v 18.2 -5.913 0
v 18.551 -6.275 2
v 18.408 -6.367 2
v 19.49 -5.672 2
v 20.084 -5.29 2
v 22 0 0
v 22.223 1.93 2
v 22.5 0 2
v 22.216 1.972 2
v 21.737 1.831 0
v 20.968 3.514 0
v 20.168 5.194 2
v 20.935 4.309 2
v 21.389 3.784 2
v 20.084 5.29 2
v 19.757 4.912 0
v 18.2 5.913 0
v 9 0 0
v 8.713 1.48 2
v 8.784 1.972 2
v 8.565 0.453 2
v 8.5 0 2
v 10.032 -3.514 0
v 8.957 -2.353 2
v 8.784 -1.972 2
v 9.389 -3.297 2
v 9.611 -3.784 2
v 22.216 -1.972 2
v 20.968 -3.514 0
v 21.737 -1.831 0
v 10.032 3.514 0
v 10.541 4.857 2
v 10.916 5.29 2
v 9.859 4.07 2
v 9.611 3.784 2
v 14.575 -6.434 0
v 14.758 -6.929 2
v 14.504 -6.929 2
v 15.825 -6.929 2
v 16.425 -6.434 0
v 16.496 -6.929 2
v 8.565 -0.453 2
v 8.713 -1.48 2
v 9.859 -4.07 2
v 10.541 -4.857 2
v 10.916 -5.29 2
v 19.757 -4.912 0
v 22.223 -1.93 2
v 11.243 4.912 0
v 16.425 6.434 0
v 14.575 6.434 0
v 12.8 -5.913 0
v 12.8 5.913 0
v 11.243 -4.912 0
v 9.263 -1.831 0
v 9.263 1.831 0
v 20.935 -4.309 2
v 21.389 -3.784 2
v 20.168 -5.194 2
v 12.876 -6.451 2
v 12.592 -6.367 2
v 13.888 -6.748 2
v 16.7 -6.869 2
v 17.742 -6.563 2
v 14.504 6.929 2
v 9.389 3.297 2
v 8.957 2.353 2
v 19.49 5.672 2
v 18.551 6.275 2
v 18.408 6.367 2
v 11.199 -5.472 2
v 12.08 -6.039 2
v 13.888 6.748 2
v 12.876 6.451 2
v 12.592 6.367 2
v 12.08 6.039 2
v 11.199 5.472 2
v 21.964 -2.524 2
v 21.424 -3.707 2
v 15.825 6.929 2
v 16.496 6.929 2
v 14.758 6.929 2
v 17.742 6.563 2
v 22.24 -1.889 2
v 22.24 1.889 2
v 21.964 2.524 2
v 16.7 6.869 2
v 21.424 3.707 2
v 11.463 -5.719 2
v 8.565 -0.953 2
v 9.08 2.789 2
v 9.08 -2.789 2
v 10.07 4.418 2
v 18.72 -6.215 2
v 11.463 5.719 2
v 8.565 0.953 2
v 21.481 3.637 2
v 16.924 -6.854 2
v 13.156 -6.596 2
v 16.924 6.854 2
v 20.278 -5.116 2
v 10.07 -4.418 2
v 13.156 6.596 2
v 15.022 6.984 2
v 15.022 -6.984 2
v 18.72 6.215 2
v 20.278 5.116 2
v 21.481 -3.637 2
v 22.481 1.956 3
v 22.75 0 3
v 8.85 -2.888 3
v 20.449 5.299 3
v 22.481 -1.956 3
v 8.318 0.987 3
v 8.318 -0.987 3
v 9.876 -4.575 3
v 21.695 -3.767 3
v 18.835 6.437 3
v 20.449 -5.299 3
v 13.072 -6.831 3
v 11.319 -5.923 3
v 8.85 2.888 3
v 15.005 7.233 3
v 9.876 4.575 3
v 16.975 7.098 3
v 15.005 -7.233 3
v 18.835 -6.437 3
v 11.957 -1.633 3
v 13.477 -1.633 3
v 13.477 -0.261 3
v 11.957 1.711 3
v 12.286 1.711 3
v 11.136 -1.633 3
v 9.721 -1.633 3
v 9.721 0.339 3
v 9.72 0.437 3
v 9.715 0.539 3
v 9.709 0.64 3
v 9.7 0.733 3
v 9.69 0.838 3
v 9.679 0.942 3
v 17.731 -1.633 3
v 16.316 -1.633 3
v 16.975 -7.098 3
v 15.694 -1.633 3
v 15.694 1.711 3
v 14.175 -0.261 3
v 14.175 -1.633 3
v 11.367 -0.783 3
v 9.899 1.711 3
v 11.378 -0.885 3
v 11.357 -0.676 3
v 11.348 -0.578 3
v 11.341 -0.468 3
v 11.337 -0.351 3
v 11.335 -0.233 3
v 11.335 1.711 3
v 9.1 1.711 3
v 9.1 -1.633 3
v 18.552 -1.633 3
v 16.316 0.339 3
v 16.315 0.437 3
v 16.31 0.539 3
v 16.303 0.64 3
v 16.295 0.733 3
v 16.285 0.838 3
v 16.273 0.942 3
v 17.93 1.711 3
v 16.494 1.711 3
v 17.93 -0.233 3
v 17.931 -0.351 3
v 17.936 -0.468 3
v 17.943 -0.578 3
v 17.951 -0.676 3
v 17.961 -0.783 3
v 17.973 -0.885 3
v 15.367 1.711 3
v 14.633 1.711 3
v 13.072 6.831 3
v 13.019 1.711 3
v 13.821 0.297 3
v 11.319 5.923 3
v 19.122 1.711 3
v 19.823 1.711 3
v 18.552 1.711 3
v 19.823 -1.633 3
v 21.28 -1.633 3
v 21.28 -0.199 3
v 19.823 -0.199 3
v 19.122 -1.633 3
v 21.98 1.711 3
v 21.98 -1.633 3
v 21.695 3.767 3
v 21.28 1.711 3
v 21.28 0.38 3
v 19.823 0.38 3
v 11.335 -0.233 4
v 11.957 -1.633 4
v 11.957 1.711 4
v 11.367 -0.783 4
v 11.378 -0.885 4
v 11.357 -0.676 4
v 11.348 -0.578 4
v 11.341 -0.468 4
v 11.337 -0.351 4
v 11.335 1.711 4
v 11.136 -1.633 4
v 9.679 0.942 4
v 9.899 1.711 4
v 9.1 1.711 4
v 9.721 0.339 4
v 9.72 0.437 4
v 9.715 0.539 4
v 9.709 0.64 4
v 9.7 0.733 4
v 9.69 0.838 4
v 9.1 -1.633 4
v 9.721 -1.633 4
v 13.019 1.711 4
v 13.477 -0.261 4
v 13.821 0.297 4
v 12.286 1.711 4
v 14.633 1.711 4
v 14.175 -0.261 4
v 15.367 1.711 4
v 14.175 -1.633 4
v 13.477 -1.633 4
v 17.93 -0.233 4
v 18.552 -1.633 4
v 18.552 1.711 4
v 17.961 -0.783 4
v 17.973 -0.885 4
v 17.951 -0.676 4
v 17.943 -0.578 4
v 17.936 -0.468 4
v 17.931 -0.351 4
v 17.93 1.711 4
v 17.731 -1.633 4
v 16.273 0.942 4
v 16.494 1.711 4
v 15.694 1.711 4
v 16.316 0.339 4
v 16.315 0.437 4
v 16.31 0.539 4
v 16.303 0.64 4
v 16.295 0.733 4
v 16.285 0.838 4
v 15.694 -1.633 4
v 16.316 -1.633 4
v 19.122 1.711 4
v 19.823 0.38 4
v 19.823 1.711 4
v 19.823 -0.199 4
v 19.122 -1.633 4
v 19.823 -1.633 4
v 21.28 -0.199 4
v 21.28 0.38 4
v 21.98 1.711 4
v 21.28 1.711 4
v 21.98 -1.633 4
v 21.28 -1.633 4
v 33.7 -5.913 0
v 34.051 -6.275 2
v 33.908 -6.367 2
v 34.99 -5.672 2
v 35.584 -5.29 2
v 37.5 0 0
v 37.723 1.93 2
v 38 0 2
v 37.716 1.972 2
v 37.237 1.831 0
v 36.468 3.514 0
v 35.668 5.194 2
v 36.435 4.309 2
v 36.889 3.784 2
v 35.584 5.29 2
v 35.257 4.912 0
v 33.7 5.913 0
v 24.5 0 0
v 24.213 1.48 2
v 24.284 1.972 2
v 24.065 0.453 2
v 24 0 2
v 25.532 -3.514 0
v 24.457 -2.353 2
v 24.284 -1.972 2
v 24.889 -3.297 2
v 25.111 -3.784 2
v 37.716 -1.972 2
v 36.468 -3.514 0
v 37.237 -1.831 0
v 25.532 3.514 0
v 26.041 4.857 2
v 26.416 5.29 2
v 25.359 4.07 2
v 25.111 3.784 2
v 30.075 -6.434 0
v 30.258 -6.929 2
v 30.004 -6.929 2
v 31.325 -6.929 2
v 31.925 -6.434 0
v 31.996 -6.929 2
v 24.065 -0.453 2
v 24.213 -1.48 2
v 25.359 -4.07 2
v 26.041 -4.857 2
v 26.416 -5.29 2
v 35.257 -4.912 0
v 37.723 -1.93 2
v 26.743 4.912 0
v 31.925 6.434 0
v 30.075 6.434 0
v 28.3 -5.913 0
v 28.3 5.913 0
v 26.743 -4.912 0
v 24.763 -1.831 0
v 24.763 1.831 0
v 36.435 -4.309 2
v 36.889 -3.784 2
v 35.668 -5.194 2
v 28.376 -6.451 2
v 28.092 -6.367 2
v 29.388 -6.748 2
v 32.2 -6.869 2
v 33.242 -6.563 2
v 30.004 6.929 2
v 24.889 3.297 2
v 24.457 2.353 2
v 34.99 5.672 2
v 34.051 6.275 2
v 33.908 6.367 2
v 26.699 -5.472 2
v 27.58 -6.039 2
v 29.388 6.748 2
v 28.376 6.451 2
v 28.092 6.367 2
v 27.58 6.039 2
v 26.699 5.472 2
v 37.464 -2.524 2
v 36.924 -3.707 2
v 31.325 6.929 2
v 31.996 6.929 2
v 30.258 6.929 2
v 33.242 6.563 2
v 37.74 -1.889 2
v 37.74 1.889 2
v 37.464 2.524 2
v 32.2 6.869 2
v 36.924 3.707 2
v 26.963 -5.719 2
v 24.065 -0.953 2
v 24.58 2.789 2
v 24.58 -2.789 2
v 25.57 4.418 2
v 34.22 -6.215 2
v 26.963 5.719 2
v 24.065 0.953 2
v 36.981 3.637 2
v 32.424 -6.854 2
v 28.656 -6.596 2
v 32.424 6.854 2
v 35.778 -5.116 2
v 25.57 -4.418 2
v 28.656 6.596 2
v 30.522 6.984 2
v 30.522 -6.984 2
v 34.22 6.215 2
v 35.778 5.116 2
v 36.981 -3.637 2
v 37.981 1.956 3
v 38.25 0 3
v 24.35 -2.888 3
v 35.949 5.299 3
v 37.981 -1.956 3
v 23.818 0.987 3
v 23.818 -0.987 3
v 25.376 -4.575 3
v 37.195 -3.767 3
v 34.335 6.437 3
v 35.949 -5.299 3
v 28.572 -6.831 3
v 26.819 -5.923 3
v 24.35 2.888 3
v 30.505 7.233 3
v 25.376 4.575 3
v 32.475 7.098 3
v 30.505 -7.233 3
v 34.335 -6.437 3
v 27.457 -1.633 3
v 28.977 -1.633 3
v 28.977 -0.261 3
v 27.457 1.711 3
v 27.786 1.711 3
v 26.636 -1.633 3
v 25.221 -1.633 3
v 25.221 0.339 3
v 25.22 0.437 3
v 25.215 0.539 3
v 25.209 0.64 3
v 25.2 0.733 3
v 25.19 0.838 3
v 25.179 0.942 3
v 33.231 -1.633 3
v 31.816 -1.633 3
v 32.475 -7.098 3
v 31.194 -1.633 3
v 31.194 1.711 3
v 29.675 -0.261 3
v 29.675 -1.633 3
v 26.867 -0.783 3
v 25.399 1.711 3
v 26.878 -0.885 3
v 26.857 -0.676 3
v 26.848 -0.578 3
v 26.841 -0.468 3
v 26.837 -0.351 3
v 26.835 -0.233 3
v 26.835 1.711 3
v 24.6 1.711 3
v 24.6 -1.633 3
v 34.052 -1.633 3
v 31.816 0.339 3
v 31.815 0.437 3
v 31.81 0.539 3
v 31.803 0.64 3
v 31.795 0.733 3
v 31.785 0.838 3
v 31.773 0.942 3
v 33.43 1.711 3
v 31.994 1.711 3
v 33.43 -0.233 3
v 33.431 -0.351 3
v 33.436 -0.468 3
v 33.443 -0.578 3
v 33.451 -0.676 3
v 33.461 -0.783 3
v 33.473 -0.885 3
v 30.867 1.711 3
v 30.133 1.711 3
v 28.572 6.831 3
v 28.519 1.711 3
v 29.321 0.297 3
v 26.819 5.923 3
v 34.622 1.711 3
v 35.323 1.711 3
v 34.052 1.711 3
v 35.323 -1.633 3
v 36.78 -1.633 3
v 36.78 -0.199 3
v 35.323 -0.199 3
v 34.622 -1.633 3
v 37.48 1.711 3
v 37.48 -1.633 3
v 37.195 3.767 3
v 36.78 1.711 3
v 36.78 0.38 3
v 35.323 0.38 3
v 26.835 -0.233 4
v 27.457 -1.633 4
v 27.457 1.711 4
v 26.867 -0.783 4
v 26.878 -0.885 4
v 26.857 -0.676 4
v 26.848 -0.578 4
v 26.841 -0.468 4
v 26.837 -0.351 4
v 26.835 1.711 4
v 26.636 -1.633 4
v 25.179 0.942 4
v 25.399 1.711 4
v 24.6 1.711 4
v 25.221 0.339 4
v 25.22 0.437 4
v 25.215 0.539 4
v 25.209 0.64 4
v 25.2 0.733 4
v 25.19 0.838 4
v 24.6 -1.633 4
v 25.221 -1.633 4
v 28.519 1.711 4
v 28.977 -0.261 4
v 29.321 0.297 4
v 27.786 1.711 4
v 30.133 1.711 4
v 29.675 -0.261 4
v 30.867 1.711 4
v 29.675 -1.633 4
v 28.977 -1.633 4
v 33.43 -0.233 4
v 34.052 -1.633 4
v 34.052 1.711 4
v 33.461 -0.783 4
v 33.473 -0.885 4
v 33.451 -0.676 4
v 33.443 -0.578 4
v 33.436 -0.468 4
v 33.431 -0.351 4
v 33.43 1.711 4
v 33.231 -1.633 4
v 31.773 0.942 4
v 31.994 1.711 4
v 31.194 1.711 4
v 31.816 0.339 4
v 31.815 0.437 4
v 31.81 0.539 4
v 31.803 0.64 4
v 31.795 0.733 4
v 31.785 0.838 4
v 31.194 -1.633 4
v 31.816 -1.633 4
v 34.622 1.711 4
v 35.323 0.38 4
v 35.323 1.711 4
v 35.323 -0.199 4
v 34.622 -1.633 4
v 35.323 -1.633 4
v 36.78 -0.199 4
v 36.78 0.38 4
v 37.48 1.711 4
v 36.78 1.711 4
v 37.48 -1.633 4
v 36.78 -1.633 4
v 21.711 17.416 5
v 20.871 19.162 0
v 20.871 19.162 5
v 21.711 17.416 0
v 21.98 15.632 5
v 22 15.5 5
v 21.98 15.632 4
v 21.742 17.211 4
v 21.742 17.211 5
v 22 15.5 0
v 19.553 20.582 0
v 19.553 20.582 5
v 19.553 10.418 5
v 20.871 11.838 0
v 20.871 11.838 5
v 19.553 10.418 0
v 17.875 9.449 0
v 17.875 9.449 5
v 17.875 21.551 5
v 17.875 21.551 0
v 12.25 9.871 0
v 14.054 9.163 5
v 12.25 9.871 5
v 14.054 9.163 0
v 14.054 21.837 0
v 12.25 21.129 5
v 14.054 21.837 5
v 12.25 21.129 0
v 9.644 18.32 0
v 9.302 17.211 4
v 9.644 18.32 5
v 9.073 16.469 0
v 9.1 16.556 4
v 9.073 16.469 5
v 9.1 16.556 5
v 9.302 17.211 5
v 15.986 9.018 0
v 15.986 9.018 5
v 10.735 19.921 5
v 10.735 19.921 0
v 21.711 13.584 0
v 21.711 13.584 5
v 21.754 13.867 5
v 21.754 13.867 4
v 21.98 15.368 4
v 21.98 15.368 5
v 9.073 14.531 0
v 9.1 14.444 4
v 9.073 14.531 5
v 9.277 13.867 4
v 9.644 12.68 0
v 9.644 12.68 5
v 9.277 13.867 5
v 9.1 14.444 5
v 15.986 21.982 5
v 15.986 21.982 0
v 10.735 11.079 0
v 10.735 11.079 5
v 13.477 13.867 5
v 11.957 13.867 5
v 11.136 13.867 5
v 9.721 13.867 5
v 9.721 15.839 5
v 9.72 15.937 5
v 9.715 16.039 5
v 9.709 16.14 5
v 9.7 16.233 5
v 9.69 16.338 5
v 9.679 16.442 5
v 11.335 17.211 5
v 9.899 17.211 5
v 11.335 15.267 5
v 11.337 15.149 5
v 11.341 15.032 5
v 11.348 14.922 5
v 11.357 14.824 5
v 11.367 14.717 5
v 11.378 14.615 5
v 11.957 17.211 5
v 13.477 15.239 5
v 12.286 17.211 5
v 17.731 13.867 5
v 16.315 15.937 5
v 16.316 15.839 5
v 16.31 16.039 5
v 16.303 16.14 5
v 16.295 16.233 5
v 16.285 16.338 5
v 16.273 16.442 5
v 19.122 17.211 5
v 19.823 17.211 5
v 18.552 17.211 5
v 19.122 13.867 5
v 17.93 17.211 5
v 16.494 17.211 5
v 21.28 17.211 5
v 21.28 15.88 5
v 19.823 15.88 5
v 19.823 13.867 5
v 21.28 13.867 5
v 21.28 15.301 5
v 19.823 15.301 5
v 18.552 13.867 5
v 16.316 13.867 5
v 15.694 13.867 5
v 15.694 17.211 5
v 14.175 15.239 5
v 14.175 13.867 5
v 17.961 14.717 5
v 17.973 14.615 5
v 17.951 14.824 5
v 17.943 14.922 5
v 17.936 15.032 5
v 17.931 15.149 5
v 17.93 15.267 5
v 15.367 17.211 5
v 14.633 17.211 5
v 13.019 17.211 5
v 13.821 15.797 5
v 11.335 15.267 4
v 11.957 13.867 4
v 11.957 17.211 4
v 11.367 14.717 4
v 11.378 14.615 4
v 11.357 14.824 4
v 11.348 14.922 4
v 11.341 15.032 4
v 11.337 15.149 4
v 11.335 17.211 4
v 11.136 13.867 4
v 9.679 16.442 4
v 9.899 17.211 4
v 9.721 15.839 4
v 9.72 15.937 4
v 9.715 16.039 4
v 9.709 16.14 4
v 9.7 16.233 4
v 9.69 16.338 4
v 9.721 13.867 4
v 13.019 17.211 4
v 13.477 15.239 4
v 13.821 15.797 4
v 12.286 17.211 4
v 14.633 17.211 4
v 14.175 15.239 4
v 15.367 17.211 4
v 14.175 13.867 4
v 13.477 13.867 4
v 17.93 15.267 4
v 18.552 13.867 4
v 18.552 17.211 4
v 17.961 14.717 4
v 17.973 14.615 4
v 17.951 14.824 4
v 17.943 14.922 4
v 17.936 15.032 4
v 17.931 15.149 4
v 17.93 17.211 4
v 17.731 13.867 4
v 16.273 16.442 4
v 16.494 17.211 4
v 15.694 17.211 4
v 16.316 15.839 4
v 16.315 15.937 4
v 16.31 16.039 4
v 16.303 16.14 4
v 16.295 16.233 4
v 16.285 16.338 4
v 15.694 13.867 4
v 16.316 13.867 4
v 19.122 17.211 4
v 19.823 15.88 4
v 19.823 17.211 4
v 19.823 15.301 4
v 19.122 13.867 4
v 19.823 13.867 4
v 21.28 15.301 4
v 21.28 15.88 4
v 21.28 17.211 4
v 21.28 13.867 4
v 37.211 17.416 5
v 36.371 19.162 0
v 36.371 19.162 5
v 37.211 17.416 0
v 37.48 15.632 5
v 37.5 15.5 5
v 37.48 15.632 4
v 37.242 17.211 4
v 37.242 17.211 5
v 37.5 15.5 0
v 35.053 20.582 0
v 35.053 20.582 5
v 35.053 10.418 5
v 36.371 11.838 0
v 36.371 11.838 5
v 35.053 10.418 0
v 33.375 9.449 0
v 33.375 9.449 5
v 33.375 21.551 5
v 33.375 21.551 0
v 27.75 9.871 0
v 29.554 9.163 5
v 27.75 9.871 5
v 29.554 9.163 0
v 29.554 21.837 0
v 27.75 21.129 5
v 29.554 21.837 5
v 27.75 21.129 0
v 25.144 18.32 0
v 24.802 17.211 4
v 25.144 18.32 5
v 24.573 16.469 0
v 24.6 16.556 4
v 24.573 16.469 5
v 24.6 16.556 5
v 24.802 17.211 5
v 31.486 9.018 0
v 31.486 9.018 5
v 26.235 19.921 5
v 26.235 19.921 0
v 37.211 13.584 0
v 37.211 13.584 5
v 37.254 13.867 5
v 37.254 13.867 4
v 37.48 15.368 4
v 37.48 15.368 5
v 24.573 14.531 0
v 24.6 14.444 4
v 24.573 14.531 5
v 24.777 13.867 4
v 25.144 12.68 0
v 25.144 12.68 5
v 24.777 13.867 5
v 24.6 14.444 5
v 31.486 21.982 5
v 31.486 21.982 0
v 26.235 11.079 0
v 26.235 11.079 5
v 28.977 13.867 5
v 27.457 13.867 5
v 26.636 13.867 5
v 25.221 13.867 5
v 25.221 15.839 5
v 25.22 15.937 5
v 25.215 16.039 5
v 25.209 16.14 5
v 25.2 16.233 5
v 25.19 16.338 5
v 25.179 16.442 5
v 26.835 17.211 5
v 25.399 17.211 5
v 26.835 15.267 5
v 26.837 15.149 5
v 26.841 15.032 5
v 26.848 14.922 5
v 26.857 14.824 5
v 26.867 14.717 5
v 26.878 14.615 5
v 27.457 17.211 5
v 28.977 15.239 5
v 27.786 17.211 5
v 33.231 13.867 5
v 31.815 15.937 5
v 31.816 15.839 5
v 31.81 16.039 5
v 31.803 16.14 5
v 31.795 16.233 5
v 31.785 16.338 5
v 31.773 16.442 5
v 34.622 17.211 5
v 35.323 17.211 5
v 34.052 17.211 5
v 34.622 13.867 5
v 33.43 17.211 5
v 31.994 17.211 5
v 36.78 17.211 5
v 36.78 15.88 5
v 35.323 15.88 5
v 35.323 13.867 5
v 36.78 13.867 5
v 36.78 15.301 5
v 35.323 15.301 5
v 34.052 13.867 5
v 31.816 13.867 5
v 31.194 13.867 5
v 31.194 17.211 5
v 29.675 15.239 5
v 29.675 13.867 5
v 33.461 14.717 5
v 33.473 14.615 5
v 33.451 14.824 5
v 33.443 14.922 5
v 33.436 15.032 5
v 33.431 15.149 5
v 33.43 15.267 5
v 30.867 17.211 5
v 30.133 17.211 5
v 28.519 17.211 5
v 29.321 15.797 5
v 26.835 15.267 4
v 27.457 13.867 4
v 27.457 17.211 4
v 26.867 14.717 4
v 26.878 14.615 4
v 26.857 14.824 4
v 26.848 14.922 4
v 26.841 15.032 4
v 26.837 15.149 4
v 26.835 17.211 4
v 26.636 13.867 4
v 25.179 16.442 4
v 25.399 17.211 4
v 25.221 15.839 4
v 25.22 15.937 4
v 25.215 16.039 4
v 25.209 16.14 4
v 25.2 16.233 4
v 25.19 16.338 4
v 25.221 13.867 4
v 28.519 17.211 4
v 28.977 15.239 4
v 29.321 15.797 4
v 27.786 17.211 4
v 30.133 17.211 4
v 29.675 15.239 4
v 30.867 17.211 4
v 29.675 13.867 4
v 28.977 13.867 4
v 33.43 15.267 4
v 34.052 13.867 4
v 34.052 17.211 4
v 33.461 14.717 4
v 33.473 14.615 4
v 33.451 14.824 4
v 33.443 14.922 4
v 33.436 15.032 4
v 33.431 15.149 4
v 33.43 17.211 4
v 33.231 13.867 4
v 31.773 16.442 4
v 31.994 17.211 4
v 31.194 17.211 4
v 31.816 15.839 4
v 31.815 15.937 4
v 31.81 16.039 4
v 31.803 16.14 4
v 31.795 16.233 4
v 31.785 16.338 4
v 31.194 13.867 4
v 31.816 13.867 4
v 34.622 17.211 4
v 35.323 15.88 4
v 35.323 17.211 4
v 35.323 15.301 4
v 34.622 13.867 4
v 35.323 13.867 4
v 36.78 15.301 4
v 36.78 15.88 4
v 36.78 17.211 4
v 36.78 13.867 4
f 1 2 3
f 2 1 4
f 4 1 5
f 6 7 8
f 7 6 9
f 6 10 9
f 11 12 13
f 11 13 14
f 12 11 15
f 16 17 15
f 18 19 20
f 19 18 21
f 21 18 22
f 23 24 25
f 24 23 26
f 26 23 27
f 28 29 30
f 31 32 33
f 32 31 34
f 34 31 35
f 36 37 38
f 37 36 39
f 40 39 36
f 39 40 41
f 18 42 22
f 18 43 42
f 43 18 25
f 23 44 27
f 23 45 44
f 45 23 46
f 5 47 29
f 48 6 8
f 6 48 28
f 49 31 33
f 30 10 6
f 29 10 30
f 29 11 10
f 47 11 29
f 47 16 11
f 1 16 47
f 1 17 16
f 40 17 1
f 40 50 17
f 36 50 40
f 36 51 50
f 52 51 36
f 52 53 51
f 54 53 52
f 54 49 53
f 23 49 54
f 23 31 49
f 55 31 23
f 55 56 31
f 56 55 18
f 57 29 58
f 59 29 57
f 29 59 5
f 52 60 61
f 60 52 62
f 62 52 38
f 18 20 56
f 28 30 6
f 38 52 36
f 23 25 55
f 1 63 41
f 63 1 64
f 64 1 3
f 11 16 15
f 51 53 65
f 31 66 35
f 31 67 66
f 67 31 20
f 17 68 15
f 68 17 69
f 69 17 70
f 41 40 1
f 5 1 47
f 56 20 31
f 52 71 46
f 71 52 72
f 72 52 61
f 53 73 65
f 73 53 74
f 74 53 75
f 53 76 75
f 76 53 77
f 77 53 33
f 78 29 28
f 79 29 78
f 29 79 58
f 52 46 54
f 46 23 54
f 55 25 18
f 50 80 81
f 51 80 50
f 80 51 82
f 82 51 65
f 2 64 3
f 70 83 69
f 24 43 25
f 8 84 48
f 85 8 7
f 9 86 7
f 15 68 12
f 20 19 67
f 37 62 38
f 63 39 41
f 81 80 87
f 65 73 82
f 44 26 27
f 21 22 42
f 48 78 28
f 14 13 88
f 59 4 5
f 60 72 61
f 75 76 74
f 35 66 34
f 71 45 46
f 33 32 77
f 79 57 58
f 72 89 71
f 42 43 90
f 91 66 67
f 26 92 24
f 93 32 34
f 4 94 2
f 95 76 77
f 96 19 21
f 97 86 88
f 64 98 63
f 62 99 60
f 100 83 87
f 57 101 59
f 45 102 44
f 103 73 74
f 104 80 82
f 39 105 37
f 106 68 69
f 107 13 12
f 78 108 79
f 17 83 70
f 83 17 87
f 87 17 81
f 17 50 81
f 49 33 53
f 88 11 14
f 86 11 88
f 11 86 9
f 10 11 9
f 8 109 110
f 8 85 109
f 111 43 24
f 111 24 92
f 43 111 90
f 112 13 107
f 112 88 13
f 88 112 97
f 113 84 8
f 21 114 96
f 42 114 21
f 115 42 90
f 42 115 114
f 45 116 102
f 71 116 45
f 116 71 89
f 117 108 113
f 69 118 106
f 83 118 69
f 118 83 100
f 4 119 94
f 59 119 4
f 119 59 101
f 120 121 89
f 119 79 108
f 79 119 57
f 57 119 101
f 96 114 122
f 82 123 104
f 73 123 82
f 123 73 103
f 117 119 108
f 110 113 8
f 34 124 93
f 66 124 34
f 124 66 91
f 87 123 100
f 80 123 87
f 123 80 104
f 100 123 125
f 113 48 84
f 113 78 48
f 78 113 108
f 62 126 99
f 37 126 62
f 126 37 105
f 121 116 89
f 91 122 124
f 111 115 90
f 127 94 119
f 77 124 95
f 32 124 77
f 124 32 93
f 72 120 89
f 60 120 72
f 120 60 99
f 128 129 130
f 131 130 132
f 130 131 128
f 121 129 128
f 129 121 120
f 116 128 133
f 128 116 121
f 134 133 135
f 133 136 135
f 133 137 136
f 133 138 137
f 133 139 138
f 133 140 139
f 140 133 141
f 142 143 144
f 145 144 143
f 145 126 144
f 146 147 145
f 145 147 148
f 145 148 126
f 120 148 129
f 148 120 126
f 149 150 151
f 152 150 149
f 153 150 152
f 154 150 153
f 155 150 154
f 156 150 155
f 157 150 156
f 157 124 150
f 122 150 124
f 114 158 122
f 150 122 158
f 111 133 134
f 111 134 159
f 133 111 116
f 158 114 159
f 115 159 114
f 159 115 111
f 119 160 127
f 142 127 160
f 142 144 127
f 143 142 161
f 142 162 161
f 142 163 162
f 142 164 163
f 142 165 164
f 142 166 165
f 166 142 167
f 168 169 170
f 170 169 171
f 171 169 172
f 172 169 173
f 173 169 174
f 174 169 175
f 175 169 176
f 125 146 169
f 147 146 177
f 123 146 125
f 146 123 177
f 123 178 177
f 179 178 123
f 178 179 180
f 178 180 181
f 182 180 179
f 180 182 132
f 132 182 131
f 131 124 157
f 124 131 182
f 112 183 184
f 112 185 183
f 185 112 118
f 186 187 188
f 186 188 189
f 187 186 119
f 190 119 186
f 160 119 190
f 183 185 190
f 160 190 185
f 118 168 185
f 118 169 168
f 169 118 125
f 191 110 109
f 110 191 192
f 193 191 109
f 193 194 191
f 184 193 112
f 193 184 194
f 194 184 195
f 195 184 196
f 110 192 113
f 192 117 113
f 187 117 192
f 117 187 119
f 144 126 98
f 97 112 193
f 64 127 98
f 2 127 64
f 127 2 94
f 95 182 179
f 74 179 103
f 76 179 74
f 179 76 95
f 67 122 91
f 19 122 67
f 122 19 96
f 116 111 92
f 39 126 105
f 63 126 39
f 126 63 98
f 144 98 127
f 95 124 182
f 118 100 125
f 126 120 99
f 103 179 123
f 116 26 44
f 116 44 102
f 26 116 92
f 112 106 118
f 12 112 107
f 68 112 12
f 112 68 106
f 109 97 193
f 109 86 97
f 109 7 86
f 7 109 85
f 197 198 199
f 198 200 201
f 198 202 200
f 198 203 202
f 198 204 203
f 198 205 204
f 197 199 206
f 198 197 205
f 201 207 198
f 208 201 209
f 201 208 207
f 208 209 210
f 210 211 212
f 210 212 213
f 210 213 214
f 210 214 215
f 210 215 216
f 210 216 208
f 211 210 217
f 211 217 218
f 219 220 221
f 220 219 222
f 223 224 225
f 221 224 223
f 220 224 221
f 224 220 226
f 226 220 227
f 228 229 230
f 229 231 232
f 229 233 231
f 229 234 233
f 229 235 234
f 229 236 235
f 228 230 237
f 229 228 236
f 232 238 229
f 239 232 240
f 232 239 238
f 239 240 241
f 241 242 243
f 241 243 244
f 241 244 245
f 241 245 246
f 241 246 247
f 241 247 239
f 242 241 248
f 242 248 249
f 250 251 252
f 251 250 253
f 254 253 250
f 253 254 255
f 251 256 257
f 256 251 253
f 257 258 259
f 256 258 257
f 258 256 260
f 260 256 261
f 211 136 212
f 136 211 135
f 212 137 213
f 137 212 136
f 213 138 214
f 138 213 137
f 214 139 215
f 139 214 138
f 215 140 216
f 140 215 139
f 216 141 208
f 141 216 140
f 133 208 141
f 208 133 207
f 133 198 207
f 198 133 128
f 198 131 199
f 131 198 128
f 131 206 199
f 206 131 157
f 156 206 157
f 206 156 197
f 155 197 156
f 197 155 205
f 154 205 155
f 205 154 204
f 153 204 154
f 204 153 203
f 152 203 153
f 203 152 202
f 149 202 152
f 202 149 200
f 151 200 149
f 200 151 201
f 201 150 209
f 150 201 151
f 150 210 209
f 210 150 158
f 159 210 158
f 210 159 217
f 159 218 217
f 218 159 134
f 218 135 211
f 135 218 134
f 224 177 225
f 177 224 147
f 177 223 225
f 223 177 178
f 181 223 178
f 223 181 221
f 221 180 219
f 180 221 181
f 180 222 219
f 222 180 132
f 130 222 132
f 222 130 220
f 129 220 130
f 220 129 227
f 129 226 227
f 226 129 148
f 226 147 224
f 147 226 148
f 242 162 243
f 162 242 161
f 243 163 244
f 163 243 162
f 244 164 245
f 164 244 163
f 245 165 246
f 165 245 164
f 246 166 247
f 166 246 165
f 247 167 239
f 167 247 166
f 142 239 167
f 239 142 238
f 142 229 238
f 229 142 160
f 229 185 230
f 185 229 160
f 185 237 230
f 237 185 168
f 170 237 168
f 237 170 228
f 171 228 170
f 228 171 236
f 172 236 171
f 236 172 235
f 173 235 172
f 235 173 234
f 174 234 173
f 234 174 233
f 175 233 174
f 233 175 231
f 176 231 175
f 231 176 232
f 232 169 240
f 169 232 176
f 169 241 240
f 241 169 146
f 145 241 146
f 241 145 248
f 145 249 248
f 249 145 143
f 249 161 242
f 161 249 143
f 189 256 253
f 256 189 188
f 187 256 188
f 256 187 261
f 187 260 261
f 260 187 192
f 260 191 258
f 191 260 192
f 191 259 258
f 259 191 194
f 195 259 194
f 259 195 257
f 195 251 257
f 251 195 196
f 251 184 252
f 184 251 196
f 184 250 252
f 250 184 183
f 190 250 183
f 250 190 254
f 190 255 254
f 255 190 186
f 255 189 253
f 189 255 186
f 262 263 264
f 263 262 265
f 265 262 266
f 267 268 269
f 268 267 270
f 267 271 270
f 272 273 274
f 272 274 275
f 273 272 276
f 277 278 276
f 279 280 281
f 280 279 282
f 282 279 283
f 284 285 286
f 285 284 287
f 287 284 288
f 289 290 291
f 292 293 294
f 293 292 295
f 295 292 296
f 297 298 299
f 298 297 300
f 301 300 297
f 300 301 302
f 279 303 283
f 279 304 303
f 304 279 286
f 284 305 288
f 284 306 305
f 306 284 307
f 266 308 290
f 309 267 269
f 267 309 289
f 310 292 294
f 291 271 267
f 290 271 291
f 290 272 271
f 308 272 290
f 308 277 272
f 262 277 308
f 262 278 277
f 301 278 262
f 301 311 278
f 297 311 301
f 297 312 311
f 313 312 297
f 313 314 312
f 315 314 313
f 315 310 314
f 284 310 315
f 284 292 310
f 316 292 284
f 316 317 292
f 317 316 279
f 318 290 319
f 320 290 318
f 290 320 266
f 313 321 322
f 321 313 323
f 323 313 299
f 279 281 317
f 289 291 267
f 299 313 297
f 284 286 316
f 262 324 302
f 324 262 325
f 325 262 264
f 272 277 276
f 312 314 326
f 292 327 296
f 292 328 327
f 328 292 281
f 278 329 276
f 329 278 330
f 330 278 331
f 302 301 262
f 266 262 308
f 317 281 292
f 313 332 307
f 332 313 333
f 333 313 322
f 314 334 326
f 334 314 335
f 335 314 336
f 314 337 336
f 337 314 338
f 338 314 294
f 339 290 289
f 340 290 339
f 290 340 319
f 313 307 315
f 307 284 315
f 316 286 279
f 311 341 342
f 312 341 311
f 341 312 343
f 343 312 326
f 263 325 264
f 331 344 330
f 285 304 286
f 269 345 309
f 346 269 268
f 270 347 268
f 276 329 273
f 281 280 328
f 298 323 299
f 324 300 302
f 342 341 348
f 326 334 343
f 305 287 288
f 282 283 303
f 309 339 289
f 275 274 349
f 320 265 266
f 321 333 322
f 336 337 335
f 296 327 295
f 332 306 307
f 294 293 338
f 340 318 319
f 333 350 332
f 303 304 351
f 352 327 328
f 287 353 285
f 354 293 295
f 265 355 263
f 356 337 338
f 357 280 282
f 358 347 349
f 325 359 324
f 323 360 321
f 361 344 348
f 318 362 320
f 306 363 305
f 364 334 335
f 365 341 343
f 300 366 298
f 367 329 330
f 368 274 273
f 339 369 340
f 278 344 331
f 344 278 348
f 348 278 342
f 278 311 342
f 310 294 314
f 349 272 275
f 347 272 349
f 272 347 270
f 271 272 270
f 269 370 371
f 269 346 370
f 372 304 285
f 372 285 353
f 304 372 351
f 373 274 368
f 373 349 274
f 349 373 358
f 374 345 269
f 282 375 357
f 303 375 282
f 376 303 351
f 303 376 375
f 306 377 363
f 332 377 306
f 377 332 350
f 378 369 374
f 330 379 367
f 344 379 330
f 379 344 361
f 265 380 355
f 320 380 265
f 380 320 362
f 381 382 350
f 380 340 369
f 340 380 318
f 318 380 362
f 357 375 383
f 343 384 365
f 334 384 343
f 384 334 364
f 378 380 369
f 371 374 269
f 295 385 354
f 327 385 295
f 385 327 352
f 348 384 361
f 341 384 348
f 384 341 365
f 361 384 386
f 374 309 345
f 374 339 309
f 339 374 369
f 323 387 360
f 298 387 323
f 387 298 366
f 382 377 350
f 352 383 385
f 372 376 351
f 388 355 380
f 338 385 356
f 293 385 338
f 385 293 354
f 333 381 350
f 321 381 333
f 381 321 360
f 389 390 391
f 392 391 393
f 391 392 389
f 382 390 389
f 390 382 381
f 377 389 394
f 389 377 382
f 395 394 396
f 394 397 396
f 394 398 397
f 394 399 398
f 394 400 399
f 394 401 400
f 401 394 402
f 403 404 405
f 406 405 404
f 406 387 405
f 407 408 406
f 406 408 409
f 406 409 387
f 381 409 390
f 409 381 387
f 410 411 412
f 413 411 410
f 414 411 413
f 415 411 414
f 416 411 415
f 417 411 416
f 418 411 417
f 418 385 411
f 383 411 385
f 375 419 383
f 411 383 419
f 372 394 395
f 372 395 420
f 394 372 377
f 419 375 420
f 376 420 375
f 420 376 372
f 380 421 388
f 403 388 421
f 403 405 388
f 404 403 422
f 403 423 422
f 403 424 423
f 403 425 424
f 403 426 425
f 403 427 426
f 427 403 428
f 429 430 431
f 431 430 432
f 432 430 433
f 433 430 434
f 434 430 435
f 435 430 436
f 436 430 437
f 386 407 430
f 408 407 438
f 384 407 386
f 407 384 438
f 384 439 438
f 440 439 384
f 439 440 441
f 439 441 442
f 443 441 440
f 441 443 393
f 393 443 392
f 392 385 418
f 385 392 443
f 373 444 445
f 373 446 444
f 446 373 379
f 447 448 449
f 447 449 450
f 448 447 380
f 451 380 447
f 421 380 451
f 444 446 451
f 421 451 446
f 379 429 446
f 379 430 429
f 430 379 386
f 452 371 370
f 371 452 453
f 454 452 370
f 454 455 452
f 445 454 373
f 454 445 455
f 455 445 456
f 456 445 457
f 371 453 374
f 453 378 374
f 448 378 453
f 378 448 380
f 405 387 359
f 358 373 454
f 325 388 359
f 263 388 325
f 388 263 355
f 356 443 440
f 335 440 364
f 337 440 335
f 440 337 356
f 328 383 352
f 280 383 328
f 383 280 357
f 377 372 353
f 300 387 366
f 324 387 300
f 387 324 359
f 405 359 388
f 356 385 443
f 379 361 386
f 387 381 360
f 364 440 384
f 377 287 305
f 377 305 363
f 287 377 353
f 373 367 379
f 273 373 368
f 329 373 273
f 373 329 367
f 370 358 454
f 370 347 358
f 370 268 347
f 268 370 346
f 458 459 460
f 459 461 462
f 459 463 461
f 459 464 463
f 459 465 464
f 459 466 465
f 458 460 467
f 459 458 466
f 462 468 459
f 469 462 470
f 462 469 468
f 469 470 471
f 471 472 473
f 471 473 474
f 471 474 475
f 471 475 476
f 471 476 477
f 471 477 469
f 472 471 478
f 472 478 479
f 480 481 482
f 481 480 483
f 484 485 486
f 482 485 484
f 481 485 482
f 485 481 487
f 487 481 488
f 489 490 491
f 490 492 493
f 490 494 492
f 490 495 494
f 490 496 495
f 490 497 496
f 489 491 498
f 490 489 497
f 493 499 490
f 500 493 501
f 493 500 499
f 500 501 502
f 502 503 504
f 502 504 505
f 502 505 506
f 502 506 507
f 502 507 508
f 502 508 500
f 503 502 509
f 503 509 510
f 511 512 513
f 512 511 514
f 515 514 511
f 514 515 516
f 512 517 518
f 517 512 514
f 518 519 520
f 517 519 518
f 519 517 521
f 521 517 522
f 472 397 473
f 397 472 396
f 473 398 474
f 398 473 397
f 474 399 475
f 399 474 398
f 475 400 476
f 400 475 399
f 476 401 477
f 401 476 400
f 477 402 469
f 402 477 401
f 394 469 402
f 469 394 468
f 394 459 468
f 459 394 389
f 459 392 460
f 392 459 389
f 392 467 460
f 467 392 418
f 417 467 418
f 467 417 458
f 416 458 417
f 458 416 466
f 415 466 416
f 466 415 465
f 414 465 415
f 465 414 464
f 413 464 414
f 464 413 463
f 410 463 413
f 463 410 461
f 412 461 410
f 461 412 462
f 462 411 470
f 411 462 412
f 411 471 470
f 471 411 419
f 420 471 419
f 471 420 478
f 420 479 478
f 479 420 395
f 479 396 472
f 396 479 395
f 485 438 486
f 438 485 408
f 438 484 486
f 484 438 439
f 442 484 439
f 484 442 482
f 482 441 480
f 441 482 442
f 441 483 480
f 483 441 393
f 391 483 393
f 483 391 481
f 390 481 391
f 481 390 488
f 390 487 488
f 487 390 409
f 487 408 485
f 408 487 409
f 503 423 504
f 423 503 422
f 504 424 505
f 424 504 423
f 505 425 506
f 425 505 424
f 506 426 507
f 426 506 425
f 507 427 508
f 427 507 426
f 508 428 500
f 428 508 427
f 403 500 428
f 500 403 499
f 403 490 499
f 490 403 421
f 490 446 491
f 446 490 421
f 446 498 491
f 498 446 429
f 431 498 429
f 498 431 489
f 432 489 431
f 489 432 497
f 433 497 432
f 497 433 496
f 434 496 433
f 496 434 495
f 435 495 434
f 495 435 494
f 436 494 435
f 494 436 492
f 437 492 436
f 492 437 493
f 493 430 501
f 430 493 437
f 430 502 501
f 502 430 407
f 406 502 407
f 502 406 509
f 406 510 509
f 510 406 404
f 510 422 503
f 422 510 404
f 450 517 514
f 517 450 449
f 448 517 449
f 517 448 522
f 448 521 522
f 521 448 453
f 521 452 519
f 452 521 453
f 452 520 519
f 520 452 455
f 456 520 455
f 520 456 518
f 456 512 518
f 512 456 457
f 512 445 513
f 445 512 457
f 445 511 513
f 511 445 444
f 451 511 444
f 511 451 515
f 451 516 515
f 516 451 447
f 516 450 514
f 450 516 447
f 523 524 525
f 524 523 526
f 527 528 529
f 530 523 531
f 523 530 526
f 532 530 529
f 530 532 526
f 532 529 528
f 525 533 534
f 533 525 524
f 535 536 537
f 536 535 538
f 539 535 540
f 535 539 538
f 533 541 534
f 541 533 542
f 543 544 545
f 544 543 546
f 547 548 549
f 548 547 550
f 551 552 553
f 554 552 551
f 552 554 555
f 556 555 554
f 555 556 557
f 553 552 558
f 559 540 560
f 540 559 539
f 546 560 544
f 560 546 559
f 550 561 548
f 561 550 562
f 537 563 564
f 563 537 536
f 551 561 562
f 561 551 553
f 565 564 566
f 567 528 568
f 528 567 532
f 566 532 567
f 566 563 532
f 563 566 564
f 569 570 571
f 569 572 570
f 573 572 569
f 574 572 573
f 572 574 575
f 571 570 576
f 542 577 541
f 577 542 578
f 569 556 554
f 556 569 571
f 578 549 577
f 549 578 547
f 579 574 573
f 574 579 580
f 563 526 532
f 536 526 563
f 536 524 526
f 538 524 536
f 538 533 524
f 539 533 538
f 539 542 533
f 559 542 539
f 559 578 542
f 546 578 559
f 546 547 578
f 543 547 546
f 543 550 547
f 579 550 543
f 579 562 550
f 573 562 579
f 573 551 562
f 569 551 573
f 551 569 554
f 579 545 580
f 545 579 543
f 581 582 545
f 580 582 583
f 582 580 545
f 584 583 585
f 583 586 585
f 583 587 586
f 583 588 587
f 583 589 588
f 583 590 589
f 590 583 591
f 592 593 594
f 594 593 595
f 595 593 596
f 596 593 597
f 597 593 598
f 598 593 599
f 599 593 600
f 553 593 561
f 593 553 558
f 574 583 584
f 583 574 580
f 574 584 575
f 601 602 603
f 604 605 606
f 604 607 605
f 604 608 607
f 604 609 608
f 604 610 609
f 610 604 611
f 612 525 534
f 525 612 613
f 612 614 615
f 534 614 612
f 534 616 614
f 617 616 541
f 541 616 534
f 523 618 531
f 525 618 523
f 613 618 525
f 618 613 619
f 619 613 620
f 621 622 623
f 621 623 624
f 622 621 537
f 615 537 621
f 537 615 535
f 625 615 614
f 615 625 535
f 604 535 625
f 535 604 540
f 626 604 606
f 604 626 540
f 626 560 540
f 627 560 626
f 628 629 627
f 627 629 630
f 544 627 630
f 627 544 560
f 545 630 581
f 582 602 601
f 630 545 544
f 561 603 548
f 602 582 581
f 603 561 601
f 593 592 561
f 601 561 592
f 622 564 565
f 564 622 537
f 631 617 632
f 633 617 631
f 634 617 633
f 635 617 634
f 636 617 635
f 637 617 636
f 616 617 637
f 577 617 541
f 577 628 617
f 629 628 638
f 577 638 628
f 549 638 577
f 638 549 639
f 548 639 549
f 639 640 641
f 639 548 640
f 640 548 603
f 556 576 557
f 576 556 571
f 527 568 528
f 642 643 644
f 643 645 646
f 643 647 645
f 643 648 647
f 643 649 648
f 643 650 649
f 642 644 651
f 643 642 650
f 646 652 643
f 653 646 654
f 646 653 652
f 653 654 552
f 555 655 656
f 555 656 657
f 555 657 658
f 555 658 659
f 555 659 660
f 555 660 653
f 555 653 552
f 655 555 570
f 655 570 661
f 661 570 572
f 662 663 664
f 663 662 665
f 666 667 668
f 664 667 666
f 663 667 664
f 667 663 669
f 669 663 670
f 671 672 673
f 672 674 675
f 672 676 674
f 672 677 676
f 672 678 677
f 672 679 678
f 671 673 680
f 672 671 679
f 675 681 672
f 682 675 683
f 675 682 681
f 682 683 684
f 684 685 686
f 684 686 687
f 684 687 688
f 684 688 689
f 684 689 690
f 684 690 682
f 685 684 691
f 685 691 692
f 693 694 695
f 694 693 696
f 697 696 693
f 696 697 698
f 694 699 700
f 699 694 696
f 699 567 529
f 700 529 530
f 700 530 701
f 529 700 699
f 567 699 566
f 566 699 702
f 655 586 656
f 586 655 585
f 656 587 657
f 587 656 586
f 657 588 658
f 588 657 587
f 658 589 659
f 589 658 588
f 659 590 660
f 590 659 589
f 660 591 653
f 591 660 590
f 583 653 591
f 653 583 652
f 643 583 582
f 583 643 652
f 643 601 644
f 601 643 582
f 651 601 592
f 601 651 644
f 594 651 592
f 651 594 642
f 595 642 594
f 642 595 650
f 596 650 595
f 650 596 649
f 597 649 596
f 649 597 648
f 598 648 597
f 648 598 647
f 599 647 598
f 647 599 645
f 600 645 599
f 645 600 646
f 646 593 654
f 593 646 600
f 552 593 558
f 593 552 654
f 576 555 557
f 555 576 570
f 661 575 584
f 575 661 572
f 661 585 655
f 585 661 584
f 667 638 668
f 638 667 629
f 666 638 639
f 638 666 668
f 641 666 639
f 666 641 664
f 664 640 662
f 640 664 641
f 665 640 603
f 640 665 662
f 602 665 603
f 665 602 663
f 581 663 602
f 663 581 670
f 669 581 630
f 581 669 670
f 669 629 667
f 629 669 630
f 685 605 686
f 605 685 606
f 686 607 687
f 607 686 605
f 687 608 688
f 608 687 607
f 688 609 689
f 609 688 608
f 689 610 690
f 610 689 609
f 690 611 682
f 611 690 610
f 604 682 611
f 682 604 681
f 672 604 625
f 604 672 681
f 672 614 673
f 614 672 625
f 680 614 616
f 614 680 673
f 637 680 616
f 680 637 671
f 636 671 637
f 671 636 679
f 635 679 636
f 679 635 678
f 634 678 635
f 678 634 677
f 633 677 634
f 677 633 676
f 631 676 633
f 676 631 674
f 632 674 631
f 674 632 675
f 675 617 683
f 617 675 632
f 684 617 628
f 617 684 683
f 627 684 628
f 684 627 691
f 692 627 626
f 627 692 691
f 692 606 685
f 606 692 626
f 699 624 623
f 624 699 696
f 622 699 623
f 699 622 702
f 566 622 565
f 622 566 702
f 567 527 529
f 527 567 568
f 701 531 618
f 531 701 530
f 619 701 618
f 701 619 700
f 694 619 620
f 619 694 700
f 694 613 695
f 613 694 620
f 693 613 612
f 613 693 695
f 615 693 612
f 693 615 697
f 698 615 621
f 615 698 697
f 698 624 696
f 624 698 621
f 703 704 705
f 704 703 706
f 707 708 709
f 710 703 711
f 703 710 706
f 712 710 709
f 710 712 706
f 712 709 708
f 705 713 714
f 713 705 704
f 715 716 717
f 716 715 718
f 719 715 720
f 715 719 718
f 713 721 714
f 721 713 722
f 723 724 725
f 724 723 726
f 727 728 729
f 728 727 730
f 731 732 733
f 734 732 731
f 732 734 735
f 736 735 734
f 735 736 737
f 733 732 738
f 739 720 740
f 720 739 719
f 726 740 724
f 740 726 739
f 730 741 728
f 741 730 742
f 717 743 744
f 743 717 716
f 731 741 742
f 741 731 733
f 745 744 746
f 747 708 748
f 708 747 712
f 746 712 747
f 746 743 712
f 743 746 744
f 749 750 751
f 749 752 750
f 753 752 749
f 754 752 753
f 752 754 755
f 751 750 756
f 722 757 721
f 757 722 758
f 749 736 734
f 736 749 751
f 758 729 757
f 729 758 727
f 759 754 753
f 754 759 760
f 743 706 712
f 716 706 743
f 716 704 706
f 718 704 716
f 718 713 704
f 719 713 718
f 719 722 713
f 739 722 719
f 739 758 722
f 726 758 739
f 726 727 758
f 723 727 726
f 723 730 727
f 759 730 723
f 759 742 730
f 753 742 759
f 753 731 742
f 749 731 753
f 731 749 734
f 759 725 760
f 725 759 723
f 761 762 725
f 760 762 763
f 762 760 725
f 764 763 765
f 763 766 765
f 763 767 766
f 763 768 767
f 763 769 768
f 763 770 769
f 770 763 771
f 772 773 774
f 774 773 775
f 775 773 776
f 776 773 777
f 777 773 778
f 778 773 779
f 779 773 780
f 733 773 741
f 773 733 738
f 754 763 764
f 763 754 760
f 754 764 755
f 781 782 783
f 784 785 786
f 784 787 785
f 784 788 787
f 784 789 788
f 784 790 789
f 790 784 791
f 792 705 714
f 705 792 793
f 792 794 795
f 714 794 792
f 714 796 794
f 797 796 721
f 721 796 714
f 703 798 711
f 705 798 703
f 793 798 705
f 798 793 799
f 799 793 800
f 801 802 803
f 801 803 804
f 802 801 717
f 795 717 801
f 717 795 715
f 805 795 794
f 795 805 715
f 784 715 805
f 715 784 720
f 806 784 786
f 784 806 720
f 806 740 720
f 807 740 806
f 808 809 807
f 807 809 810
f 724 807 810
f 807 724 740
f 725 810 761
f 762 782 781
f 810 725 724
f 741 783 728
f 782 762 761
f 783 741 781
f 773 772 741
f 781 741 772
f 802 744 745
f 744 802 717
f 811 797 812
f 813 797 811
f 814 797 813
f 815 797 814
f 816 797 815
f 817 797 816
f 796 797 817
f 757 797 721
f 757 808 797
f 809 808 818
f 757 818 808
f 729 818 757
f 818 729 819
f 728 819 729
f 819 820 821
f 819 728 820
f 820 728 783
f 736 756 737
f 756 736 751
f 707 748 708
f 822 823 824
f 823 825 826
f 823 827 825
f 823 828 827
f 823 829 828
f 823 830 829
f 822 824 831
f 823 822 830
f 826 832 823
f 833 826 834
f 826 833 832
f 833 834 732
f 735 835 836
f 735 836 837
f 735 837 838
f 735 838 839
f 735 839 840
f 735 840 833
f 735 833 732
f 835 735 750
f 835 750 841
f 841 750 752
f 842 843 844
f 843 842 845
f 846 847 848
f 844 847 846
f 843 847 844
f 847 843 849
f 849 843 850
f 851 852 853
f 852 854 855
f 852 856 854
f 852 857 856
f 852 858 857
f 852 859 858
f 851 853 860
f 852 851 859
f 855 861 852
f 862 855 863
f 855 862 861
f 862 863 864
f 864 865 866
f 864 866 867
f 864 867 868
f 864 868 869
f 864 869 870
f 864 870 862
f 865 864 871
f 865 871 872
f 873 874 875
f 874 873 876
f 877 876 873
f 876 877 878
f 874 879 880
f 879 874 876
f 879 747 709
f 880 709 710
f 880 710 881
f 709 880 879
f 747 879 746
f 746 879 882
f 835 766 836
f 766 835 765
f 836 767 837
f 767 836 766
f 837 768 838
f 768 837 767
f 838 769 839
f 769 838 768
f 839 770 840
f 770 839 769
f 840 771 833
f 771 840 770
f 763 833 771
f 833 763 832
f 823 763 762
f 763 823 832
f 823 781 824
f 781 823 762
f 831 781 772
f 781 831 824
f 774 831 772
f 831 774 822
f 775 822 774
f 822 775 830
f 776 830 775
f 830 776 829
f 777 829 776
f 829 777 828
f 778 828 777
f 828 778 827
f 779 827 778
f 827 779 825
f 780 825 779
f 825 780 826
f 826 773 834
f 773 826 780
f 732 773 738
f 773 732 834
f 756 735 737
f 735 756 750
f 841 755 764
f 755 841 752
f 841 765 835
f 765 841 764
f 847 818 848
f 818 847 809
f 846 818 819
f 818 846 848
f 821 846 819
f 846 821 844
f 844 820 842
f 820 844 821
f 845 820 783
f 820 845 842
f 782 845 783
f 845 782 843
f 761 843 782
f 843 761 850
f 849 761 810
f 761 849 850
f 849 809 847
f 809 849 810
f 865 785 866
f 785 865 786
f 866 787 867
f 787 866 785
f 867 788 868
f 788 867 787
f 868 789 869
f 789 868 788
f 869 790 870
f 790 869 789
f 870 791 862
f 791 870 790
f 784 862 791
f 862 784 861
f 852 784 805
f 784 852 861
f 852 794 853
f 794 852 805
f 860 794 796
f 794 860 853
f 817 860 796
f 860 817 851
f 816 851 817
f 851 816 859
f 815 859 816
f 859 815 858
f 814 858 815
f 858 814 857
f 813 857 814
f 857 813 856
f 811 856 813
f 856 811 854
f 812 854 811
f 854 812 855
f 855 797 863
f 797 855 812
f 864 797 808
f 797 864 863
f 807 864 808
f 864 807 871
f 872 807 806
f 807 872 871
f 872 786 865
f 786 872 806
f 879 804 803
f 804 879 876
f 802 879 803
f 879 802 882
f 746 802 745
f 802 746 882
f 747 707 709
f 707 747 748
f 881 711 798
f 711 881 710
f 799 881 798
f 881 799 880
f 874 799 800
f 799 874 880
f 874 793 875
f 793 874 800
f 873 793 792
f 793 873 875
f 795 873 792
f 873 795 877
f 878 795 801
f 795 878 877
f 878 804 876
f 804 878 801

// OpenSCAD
include <../Tiles/18xx tiles basic functions.scad>
make_token_array("NYNH",2,2);
